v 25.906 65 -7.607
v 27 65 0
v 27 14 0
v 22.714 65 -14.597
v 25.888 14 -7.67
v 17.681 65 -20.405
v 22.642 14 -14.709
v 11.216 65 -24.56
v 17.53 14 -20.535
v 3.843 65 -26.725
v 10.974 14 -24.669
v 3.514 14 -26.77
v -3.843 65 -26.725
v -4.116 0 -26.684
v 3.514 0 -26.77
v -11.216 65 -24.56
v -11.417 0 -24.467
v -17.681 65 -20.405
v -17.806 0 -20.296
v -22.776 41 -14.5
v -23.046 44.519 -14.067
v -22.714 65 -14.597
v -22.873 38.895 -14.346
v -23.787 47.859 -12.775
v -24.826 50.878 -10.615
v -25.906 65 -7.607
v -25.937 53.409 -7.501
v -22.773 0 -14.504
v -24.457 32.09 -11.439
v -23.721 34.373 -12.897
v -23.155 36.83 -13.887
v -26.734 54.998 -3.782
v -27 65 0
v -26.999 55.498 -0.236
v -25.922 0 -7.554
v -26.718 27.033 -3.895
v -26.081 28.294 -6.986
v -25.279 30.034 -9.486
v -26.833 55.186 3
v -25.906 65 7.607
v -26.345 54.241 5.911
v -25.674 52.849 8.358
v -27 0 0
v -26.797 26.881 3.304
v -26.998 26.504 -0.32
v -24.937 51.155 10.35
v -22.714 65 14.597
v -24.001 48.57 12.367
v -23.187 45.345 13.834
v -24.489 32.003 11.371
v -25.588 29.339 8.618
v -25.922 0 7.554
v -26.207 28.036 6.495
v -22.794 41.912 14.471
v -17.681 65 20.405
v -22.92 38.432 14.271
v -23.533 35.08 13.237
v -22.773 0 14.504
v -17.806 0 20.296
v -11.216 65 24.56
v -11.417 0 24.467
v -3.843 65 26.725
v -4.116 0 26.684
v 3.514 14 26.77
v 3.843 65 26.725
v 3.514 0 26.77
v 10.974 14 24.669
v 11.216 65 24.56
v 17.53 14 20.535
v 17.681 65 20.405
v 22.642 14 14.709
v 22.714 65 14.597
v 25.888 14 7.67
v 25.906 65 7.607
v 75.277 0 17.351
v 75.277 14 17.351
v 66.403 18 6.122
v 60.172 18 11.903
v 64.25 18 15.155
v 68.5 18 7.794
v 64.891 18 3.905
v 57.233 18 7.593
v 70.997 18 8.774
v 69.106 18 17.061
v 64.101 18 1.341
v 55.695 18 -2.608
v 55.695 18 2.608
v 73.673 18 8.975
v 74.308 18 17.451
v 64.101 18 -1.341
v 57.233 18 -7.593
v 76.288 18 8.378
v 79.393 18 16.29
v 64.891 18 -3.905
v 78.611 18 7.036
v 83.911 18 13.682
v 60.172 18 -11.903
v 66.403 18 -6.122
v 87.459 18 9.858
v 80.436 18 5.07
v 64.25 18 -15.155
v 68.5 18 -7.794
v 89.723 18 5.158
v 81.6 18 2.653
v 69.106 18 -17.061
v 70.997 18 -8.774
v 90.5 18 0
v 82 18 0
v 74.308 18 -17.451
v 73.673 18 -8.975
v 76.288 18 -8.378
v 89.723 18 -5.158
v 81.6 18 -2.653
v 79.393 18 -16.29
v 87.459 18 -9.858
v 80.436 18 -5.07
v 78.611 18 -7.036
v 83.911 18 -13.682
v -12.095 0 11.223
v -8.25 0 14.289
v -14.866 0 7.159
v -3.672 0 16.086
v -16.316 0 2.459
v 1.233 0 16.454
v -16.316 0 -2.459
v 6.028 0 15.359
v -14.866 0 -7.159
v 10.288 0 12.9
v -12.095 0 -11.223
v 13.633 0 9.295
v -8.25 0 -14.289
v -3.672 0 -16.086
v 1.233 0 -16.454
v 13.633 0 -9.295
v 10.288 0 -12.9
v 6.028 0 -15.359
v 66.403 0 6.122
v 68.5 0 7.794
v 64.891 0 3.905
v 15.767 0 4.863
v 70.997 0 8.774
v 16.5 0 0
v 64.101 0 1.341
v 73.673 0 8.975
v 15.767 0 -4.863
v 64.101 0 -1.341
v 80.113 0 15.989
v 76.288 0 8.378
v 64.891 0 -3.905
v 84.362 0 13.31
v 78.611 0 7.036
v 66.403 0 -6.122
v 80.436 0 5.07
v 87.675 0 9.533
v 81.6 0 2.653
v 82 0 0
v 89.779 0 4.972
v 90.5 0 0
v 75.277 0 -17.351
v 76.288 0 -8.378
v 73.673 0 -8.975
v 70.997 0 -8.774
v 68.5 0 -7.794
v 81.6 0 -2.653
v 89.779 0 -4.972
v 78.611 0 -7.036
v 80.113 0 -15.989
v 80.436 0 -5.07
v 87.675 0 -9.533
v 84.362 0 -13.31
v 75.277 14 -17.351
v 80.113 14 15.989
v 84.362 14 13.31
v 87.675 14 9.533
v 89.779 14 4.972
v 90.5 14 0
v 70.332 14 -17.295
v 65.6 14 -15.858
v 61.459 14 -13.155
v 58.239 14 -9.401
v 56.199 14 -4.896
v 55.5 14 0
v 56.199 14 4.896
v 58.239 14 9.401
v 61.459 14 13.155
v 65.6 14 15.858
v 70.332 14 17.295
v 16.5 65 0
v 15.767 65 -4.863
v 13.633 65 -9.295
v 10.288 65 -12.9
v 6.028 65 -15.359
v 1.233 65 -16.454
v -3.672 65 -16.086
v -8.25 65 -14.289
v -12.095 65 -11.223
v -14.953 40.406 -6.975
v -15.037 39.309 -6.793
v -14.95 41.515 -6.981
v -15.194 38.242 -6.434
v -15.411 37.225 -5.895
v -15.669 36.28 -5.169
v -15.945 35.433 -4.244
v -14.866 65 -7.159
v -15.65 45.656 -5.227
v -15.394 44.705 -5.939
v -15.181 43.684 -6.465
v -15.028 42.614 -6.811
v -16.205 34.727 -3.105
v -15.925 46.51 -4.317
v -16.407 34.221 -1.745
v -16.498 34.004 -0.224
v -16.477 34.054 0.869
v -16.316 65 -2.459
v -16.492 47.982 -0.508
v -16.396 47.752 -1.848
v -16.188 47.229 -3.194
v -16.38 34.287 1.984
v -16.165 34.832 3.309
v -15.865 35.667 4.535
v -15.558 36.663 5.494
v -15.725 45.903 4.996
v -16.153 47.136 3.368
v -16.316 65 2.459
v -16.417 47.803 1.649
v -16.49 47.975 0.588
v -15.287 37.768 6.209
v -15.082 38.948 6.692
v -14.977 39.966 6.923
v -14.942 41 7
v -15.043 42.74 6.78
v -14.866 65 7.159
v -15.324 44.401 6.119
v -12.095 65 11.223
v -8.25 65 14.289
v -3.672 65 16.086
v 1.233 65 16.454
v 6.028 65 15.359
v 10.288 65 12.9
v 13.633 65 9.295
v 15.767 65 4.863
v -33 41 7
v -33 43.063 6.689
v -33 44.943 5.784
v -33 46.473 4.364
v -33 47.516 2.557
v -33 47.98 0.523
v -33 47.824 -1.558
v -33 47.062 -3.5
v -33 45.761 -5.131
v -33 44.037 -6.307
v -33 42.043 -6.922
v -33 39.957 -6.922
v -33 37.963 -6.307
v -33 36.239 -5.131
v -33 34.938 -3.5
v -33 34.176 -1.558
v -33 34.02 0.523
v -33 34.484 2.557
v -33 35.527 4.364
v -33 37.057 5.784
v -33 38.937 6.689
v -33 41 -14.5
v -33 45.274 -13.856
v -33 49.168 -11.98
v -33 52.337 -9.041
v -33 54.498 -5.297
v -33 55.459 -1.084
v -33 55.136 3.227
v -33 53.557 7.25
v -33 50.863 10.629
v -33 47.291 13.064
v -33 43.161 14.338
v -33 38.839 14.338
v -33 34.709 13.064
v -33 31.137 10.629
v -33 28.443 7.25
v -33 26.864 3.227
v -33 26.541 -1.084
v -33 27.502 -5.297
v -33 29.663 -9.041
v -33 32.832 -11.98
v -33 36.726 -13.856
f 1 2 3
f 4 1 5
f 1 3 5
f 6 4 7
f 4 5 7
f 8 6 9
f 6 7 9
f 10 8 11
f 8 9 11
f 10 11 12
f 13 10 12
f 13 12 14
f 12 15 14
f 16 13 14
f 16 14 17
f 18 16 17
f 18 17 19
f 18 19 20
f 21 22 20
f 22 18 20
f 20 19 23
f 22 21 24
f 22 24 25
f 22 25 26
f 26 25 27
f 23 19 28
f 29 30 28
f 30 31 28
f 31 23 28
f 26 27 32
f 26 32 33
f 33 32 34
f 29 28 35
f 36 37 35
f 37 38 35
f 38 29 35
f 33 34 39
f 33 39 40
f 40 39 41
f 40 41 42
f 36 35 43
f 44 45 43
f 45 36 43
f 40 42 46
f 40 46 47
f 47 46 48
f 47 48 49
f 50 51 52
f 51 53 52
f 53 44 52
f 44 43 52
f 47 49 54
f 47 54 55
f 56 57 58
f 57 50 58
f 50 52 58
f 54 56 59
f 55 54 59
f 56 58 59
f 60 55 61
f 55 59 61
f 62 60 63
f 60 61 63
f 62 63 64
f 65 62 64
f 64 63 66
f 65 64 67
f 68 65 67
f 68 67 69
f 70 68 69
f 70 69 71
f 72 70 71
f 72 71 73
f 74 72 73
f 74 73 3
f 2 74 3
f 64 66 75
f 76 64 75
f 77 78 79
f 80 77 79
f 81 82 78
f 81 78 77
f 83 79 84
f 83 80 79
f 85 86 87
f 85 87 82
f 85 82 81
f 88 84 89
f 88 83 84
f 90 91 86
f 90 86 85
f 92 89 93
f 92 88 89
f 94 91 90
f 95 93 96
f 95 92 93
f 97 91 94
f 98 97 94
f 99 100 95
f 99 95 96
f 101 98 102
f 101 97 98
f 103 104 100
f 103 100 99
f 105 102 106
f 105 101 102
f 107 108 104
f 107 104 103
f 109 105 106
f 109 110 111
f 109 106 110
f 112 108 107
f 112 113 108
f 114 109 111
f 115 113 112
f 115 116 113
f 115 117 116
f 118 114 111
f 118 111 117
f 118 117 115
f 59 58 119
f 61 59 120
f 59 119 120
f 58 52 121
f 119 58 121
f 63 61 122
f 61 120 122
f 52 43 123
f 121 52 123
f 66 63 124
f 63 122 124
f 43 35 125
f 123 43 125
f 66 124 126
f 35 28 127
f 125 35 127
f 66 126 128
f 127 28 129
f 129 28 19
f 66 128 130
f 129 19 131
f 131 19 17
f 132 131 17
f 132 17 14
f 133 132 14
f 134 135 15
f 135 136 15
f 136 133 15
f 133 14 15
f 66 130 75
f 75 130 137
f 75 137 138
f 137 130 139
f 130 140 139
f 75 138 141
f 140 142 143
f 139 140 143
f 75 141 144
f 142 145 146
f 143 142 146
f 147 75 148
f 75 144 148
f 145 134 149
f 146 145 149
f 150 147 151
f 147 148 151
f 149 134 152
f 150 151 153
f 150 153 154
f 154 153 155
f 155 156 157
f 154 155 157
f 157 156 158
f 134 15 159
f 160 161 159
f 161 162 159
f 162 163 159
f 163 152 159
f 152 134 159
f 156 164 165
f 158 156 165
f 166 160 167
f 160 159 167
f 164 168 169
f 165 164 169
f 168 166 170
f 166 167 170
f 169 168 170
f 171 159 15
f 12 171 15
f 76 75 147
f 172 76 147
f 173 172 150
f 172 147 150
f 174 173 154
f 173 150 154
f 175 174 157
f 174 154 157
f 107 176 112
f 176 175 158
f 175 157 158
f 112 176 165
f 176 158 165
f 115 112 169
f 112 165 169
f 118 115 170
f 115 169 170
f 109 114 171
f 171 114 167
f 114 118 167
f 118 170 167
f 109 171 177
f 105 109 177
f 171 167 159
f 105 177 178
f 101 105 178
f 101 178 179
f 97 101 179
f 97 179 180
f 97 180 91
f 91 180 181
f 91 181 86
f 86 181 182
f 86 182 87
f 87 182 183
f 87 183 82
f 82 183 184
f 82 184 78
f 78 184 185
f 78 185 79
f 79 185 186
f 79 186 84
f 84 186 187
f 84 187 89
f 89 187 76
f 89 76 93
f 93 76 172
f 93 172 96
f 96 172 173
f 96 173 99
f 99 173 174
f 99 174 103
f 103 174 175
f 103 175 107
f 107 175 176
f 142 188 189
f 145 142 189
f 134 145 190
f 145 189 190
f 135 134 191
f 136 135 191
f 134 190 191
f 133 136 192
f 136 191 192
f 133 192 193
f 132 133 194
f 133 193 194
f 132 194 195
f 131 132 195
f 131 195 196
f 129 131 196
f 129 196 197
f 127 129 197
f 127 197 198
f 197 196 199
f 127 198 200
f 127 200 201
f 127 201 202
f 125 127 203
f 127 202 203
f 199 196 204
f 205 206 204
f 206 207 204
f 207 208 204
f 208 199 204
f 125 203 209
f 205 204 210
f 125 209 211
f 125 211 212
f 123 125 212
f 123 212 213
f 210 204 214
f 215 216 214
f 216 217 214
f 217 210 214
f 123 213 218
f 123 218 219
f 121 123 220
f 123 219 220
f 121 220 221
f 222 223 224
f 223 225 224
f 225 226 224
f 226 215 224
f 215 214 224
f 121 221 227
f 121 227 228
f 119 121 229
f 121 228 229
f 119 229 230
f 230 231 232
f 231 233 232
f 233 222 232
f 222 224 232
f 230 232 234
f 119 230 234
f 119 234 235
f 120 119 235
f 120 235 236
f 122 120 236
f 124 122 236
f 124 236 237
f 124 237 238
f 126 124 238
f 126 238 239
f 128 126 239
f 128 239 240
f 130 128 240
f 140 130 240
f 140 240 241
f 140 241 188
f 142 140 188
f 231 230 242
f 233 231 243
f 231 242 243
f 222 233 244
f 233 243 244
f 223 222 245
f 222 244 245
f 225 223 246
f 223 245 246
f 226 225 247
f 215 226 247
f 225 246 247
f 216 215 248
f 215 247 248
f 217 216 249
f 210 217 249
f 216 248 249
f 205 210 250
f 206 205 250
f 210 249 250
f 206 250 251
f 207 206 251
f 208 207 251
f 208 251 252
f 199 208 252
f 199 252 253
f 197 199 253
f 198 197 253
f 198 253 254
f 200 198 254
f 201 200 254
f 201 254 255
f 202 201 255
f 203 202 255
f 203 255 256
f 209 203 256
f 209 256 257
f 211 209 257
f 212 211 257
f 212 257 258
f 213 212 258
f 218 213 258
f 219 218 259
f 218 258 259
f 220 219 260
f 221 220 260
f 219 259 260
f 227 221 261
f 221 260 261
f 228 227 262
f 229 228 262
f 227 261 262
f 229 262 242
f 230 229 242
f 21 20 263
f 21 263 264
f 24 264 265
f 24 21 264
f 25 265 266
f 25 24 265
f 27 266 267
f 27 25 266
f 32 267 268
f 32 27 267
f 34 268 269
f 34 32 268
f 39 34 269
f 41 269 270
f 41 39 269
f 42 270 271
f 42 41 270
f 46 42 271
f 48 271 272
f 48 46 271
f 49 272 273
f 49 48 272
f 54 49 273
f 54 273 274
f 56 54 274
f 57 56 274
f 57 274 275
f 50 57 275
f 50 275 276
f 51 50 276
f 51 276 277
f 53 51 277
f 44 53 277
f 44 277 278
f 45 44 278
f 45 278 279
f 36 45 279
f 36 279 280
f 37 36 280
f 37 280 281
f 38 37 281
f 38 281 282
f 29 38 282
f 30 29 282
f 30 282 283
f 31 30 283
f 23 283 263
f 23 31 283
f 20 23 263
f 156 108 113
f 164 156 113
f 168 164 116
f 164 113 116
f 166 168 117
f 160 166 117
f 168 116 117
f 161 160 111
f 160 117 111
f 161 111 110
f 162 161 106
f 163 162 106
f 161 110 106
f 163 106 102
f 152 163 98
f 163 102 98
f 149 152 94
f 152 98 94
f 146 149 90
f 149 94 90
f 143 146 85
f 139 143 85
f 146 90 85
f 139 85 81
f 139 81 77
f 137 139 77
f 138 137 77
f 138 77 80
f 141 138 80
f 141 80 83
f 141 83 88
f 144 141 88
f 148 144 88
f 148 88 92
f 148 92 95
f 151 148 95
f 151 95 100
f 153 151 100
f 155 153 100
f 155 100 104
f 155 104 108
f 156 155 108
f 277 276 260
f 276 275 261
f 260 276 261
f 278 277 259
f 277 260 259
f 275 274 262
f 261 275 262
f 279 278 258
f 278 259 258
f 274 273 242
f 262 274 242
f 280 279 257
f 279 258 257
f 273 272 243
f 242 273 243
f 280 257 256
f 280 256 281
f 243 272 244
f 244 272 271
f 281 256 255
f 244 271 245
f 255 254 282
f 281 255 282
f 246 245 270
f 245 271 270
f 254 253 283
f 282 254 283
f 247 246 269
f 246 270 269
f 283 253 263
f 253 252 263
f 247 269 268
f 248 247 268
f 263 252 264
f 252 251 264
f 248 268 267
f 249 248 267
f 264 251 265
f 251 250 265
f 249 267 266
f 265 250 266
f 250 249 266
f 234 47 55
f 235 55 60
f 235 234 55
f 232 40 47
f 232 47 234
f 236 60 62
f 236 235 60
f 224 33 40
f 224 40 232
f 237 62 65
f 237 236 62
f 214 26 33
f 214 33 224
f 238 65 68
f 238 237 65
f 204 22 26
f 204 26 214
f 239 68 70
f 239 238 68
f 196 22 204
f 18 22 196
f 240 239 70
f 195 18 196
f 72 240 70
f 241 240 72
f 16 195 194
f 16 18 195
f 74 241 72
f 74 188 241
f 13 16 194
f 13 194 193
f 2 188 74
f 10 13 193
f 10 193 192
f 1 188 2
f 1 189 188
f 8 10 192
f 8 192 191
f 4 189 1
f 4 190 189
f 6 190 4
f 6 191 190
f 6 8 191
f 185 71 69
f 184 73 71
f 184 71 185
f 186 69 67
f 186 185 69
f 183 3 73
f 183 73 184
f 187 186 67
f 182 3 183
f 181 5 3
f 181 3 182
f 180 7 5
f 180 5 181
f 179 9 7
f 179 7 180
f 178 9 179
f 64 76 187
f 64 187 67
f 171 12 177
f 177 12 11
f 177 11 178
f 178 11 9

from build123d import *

# Parameters (mm, degrees)
EXTRUDE_1_DEPTH     = 14
SKETCH_2_R          = 27
EXTRUDE_2_DEPTH     = 65
SKETCH_3_R          = 17.5
EXTRUDE_3_DEPTH     = 18
SKETCH_4_R          = 14.5
EXTRUDE_4_DEPTH     = 33
SKETCH_5_R          = 16.5
CUT_EXTRUDE_1_DEPTH = 66.0000001
SKETCH_6_R          = 9
CUT_EXTRUDE_2_DEPTH = 19.0000001
SKETCH_7_R          = 7
CUT_EXTRUDE_3_DEPTH = 33


with BuildPart() as part:
    # 草图1 → 凸台-拉伸1 (new body)
    with BuildSketch(Plane(origin=(0, 0, 0), x_dir=(1, 0, 0), z_dir=(0, 1, 0))):
        with BuildLine():
            Line((3.51369863, -26.770392637), (75.27739726, -17.351180413))
            ThreePointArc((75.27739726, -17.351180413), (90.5, 0), (75.27739726, 17.351180413))
            Line((75.27739726, 17.351180413), (3.51369863, 26.770392637))
            ThreePointArc((3.51369863, 26.770392637), (-27, 0), (3.51369863, -26.770392637))
        make_face()
    extrude(amount=EXTRUDE_1_DEPTH)

    # 草图2 → 凸台-拉伸2 (add)
    with BuildSketch(Plane(origin=(0, 0, 0), x_dir=(1, 0, 0), z_dir=(0, 1, 0))):
        Circle(SKETCH_2_R)
    extrude(amount=EXTRUDE_2_DEPTH)

    # 草图3 → 凸台-拉伸3 (add)
    with BuildSketch(Plane(origin=(0, 0, 0), x_dir=(1, 0, 0), z_dir=(0, 1, 0))):
        with Locations((73, 0)):
            Circle(SKETCH_3_R)
    extrude(amount=EXTRUDE_3_DEPTH)

    # 草图4 → 凸台-拉伸4 (add)
    with BuildSketch(Plane(origin=(0, 0, 0), x_dir=(0, 0, -1), z_dir=(1, 0, 0))):
        with Locations((0, 41)):
            Circle(SKETCH_4_R)
    extrude(amount=-EXTRUDE_4_DEPTH)

    # 草图5 → 切除-拉伸1 (cut, through all)
    with BuildSketch(Plane(origin=(0, 65, 0), x_dir=(1, 0, 0), z_dir=(0, 1, 0))):
        Circle(SKETCH_5_R)
    extrude(amount=-CUT_EXTRUDE_1_DEPTH, mode=Mode.SUBTRACT)

    # 草图6 → 切除-拉伸2 (cut, through all)
    with BuildSketch(Plane(origin=(0, 18, 0), x_dir=(1, 0, 0), z_dir=(0, 1, 0))):
        with Locations((73, 0)):
            Circle(SKETCH_6_R)
    extrude(amount=-CUT_EXTRUDE_2_DEPTH, mode=Mode.SUBTRACT)

    # 草图7 → 切除-拉伸3 (cut)
    with BuildSketch(Plane.ZY.offset(33)):
        with Locations((0, 41)):
            Circle(SKETCH_7_R)
    extrude(amount=-CUT_EXTRUDE_3_DEPTH, mode=Mode.SUBTRACT)


solid = part.part
